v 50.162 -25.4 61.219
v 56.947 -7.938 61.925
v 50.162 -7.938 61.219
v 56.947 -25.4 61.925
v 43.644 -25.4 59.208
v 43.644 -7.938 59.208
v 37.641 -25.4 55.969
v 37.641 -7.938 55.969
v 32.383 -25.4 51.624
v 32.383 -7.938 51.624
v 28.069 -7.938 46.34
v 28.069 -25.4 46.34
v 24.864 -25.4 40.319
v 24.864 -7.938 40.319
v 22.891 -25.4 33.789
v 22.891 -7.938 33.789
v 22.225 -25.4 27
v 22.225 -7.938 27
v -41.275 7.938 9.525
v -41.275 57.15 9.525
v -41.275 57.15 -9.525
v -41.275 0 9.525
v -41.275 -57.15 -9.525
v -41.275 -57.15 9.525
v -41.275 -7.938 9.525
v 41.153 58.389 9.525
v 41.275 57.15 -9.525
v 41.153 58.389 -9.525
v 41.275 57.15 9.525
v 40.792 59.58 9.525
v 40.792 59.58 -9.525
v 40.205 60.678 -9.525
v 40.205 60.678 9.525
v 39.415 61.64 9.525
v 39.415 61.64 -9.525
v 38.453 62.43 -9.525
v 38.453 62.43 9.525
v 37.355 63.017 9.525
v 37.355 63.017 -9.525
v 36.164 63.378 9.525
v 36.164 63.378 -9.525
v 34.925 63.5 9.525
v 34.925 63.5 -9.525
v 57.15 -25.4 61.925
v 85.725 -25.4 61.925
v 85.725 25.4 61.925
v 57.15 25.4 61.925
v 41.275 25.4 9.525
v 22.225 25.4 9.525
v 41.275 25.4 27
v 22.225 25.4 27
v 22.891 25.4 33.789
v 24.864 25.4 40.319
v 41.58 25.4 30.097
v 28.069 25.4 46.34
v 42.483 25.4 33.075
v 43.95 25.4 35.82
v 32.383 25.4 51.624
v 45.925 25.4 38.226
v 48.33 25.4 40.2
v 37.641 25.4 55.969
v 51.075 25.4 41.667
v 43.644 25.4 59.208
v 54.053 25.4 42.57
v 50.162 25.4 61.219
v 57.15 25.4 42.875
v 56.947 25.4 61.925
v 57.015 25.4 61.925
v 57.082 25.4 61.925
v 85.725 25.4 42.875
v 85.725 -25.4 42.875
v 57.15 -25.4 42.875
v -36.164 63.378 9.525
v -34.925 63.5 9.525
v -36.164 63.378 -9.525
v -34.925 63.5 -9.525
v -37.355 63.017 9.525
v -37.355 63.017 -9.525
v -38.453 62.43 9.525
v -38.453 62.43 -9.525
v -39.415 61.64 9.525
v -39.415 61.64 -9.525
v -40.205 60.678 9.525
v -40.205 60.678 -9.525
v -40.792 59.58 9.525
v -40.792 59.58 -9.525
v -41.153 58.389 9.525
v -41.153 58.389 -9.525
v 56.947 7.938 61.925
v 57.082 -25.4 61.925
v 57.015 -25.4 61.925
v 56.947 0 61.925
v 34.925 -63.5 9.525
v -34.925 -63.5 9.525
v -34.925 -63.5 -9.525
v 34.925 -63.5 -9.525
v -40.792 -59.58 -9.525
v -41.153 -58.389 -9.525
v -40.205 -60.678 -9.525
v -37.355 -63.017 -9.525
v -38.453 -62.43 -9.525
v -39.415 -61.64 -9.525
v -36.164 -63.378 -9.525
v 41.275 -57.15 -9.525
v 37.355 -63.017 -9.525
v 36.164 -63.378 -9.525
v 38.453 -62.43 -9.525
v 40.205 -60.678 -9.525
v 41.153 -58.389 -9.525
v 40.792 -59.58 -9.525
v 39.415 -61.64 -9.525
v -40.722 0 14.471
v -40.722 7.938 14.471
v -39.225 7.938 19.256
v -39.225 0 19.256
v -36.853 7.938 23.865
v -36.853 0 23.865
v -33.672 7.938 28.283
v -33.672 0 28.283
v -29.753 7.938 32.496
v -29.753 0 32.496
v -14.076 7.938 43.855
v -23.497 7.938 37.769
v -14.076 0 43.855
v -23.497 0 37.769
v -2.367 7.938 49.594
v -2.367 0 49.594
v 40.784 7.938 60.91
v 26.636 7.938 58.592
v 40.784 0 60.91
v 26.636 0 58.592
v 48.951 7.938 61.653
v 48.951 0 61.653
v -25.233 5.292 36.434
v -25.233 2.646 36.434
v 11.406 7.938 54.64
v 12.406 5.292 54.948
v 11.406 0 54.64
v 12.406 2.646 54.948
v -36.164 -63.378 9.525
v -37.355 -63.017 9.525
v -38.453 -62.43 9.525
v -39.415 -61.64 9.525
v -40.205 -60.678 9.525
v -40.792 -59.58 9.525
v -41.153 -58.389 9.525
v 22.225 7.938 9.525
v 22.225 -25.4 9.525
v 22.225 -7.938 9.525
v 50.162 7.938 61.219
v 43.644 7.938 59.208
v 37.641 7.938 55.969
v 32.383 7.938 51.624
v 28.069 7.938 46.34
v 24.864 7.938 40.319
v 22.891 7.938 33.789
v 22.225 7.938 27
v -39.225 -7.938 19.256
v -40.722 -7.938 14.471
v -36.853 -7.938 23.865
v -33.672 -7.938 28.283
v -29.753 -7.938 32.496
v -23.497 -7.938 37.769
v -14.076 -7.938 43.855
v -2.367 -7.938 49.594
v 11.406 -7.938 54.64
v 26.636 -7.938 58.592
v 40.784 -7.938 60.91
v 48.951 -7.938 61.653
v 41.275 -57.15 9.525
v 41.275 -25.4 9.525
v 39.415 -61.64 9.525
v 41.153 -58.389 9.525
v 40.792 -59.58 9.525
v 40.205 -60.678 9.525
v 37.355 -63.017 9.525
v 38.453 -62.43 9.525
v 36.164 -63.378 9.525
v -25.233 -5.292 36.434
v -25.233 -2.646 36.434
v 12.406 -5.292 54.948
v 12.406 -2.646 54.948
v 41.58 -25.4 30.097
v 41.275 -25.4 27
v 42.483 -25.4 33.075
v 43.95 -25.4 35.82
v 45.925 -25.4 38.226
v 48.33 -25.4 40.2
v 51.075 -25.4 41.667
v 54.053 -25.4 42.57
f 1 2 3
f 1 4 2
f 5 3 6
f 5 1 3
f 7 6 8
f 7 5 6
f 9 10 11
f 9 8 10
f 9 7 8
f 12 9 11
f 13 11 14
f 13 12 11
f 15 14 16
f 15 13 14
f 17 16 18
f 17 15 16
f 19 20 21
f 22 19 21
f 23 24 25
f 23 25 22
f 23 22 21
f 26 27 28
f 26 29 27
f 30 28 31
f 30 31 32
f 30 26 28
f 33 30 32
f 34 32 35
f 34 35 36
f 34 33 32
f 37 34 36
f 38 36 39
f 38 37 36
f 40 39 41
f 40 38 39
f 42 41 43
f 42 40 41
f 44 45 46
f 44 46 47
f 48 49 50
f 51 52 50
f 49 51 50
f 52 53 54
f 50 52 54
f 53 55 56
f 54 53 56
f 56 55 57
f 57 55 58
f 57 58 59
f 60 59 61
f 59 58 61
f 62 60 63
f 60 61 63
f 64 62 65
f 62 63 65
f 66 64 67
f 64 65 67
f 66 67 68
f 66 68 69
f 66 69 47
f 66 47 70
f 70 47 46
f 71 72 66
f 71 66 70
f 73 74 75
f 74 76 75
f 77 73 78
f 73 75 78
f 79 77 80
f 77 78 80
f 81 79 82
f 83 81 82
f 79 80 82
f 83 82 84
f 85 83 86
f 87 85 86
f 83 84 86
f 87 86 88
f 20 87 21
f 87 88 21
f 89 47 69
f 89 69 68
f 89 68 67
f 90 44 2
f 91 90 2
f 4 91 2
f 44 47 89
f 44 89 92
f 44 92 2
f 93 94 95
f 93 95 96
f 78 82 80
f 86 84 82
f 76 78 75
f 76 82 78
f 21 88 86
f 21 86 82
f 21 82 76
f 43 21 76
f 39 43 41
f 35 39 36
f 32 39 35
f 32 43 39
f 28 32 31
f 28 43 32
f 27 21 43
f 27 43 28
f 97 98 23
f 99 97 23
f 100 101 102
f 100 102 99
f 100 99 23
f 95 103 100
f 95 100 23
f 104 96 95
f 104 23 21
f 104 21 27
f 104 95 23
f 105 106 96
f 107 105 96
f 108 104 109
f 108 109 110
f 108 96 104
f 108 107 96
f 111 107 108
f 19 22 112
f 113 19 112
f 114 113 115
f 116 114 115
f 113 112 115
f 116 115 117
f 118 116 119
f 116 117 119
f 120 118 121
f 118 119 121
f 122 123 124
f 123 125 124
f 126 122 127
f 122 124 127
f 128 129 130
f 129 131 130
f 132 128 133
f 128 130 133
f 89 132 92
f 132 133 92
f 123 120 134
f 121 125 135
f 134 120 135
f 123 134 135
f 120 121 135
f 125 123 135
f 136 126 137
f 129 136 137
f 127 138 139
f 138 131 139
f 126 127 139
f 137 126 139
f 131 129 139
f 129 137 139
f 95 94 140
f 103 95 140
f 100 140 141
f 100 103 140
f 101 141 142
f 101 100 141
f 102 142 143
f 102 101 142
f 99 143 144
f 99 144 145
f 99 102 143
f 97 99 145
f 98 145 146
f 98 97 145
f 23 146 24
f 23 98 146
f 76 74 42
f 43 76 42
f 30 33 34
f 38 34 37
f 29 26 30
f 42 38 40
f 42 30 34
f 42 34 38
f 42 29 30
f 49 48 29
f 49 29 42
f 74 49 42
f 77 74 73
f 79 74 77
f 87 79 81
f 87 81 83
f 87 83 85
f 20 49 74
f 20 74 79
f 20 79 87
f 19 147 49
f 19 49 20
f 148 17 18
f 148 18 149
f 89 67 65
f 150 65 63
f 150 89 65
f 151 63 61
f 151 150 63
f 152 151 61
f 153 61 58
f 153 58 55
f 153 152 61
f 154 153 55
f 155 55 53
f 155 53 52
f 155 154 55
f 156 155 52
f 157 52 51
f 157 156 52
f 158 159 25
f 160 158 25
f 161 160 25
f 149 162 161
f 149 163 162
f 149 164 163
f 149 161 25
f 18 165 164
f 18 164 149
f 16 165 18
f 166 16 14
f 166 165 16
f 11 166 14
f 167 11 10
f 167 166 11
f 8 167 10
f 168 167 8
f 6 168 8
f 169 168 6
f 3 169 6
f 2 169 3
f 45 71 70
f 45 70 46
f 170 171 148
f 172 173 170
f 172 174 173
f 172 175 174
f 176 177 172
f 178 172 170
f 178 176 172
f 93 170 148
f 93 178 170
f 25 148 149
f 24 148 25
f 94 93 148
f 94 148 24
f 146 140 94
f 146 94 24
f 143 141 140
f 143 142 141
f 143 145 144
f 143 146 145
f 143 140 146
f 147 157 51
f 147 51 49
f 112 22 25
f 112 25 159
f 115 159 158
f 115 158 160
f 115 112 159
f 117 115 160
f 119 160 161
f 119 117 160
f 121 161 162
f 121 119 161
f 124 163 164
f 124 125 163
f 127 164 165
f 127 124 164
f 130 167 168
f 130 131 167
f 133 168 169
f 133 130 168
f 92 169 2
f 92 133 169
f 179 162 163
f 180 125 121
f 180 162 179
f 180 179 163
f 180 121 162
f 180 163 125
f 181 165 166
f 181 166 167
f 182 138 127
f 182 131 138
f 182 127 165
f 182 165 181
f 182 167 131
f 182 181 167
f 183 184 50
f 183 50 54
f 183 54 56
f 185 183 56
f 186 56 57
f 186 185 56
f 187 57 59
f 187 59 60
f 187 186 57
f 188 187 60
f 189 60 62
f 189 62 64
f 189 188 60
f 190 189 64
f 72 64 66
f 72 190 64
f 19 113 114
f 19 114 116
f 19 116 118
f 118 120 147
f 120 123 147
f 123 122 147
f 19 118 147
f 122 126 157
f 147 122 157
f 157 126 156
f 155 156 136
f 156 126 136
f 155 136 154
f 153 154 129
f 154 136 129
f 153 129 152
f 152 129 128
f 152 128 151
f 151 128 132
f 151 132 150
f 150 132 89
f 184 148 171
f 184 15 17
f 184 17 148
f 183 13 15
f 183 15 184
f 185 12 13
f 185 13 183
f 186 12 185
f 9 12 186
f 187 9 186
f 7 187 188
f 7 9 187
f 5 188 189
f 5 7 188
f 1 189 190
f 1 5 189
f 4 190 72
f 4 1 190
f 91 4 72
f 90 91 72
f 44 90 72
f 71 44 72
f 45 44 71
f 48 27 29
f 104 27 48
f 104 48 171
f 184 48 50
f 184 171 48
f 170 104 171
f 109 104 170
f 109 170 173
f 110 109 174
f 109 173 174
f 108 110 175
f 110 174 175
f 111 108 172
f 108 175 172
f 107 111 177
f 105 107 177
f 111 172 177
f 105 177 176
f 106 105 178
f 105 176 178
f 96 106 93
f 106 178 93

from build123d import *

# Parameters (mm, degrees)
F1_DEPTH = 63.5
F0_W     = 25.4
F0_H     = 19.05
F2_DEPTH = 25.4
F3_DEPTH = 7.9375
F4_R     = 6.35


with BuildPart() as f1:
    # F0 (on Front) → F1 (new body, symmetric)
    with BuildSketch(Plane.XZ):
        Polygon((41.275, -9.525), (41.275, 9.525), (22.225, 9.525), (-41.275, 9.525), (-41.275, -9.525), align=None)
    extrude(amount=F1_DEPTH, both=True)

    # F0 (on Front) → F2 (join, symmetric)
    with BuildSketch(Plane.XZ):
        with BuildLine():
            Line((22.225, 9.525), (41.275, 9.525))
            Line((41.275, 9.525), (41.275, 27.0002))
            ThreePointArc((41.275, 27.0002), (45.9246798487, 38.2255201513), (57.15, 42.8752))
            Line((57.15, 42.8752), (60.325, 42.8752))
            Line((60.325, 42.8752), (60.325, 61.9252))
            Line((60.325, 61.9252), (57.15, 61.9252))
            ThreePointArc((57.15, 61.9252), (57.0484918683, 61.925052485), (56.9469845941, 61.9246099413))
            ThreePointArc((56.9469845941, 61.9246099413), (32.3826228876, 51.6240229358), (22.225, 27.0002))
            Line((22.225, 27.0002), (22.225, 9.525))
        make_face()
        with Locations((73.025, 52.4002)):
            Rectangle(F0_W, F0_H)
    extrude(amount=F2_DEPTH, both=True)

    # F0 (on Front) → F3 (join, symmetric)
    with BuildSketch(Plane.XZ):
        with BuildLine():
            Line((-41.275, 9.525), (22.225, 9.525))
            Line((22.225, 9.525), (22.225, 27.0002))
            ThreePointArc((22.225, 27.0002), (32.3826228876, 51.6240229358), (56.9469845941, 61.9246099413))
            add(Edge.make_bspline(
                [(-41.275, 9.525), (-40.930863954, 39.584786099), (13.8540179611, 61.7648086868), (56.9469845941, 61.9246099413)],
                knots=[0, 0, 0, 0, 111.3296329326, 111.3296329326, 111.3296329326, 111.3296329326], degree=3))
        make_face()
    extrude(amount=F3_DEPTH, both=True)

    # F4
    f4_edges = [f1.edges().sort_by_distance(p)[0] for p in [
        (-41.275, -63.5, 0),
        (41.275, -63.5, 0),
        (41.275, 63.5, 0),
        (-41.275, 63.5, 0),
    ]]
    fillet(f4_edges, radius=F4_R)


solid = f1.part
